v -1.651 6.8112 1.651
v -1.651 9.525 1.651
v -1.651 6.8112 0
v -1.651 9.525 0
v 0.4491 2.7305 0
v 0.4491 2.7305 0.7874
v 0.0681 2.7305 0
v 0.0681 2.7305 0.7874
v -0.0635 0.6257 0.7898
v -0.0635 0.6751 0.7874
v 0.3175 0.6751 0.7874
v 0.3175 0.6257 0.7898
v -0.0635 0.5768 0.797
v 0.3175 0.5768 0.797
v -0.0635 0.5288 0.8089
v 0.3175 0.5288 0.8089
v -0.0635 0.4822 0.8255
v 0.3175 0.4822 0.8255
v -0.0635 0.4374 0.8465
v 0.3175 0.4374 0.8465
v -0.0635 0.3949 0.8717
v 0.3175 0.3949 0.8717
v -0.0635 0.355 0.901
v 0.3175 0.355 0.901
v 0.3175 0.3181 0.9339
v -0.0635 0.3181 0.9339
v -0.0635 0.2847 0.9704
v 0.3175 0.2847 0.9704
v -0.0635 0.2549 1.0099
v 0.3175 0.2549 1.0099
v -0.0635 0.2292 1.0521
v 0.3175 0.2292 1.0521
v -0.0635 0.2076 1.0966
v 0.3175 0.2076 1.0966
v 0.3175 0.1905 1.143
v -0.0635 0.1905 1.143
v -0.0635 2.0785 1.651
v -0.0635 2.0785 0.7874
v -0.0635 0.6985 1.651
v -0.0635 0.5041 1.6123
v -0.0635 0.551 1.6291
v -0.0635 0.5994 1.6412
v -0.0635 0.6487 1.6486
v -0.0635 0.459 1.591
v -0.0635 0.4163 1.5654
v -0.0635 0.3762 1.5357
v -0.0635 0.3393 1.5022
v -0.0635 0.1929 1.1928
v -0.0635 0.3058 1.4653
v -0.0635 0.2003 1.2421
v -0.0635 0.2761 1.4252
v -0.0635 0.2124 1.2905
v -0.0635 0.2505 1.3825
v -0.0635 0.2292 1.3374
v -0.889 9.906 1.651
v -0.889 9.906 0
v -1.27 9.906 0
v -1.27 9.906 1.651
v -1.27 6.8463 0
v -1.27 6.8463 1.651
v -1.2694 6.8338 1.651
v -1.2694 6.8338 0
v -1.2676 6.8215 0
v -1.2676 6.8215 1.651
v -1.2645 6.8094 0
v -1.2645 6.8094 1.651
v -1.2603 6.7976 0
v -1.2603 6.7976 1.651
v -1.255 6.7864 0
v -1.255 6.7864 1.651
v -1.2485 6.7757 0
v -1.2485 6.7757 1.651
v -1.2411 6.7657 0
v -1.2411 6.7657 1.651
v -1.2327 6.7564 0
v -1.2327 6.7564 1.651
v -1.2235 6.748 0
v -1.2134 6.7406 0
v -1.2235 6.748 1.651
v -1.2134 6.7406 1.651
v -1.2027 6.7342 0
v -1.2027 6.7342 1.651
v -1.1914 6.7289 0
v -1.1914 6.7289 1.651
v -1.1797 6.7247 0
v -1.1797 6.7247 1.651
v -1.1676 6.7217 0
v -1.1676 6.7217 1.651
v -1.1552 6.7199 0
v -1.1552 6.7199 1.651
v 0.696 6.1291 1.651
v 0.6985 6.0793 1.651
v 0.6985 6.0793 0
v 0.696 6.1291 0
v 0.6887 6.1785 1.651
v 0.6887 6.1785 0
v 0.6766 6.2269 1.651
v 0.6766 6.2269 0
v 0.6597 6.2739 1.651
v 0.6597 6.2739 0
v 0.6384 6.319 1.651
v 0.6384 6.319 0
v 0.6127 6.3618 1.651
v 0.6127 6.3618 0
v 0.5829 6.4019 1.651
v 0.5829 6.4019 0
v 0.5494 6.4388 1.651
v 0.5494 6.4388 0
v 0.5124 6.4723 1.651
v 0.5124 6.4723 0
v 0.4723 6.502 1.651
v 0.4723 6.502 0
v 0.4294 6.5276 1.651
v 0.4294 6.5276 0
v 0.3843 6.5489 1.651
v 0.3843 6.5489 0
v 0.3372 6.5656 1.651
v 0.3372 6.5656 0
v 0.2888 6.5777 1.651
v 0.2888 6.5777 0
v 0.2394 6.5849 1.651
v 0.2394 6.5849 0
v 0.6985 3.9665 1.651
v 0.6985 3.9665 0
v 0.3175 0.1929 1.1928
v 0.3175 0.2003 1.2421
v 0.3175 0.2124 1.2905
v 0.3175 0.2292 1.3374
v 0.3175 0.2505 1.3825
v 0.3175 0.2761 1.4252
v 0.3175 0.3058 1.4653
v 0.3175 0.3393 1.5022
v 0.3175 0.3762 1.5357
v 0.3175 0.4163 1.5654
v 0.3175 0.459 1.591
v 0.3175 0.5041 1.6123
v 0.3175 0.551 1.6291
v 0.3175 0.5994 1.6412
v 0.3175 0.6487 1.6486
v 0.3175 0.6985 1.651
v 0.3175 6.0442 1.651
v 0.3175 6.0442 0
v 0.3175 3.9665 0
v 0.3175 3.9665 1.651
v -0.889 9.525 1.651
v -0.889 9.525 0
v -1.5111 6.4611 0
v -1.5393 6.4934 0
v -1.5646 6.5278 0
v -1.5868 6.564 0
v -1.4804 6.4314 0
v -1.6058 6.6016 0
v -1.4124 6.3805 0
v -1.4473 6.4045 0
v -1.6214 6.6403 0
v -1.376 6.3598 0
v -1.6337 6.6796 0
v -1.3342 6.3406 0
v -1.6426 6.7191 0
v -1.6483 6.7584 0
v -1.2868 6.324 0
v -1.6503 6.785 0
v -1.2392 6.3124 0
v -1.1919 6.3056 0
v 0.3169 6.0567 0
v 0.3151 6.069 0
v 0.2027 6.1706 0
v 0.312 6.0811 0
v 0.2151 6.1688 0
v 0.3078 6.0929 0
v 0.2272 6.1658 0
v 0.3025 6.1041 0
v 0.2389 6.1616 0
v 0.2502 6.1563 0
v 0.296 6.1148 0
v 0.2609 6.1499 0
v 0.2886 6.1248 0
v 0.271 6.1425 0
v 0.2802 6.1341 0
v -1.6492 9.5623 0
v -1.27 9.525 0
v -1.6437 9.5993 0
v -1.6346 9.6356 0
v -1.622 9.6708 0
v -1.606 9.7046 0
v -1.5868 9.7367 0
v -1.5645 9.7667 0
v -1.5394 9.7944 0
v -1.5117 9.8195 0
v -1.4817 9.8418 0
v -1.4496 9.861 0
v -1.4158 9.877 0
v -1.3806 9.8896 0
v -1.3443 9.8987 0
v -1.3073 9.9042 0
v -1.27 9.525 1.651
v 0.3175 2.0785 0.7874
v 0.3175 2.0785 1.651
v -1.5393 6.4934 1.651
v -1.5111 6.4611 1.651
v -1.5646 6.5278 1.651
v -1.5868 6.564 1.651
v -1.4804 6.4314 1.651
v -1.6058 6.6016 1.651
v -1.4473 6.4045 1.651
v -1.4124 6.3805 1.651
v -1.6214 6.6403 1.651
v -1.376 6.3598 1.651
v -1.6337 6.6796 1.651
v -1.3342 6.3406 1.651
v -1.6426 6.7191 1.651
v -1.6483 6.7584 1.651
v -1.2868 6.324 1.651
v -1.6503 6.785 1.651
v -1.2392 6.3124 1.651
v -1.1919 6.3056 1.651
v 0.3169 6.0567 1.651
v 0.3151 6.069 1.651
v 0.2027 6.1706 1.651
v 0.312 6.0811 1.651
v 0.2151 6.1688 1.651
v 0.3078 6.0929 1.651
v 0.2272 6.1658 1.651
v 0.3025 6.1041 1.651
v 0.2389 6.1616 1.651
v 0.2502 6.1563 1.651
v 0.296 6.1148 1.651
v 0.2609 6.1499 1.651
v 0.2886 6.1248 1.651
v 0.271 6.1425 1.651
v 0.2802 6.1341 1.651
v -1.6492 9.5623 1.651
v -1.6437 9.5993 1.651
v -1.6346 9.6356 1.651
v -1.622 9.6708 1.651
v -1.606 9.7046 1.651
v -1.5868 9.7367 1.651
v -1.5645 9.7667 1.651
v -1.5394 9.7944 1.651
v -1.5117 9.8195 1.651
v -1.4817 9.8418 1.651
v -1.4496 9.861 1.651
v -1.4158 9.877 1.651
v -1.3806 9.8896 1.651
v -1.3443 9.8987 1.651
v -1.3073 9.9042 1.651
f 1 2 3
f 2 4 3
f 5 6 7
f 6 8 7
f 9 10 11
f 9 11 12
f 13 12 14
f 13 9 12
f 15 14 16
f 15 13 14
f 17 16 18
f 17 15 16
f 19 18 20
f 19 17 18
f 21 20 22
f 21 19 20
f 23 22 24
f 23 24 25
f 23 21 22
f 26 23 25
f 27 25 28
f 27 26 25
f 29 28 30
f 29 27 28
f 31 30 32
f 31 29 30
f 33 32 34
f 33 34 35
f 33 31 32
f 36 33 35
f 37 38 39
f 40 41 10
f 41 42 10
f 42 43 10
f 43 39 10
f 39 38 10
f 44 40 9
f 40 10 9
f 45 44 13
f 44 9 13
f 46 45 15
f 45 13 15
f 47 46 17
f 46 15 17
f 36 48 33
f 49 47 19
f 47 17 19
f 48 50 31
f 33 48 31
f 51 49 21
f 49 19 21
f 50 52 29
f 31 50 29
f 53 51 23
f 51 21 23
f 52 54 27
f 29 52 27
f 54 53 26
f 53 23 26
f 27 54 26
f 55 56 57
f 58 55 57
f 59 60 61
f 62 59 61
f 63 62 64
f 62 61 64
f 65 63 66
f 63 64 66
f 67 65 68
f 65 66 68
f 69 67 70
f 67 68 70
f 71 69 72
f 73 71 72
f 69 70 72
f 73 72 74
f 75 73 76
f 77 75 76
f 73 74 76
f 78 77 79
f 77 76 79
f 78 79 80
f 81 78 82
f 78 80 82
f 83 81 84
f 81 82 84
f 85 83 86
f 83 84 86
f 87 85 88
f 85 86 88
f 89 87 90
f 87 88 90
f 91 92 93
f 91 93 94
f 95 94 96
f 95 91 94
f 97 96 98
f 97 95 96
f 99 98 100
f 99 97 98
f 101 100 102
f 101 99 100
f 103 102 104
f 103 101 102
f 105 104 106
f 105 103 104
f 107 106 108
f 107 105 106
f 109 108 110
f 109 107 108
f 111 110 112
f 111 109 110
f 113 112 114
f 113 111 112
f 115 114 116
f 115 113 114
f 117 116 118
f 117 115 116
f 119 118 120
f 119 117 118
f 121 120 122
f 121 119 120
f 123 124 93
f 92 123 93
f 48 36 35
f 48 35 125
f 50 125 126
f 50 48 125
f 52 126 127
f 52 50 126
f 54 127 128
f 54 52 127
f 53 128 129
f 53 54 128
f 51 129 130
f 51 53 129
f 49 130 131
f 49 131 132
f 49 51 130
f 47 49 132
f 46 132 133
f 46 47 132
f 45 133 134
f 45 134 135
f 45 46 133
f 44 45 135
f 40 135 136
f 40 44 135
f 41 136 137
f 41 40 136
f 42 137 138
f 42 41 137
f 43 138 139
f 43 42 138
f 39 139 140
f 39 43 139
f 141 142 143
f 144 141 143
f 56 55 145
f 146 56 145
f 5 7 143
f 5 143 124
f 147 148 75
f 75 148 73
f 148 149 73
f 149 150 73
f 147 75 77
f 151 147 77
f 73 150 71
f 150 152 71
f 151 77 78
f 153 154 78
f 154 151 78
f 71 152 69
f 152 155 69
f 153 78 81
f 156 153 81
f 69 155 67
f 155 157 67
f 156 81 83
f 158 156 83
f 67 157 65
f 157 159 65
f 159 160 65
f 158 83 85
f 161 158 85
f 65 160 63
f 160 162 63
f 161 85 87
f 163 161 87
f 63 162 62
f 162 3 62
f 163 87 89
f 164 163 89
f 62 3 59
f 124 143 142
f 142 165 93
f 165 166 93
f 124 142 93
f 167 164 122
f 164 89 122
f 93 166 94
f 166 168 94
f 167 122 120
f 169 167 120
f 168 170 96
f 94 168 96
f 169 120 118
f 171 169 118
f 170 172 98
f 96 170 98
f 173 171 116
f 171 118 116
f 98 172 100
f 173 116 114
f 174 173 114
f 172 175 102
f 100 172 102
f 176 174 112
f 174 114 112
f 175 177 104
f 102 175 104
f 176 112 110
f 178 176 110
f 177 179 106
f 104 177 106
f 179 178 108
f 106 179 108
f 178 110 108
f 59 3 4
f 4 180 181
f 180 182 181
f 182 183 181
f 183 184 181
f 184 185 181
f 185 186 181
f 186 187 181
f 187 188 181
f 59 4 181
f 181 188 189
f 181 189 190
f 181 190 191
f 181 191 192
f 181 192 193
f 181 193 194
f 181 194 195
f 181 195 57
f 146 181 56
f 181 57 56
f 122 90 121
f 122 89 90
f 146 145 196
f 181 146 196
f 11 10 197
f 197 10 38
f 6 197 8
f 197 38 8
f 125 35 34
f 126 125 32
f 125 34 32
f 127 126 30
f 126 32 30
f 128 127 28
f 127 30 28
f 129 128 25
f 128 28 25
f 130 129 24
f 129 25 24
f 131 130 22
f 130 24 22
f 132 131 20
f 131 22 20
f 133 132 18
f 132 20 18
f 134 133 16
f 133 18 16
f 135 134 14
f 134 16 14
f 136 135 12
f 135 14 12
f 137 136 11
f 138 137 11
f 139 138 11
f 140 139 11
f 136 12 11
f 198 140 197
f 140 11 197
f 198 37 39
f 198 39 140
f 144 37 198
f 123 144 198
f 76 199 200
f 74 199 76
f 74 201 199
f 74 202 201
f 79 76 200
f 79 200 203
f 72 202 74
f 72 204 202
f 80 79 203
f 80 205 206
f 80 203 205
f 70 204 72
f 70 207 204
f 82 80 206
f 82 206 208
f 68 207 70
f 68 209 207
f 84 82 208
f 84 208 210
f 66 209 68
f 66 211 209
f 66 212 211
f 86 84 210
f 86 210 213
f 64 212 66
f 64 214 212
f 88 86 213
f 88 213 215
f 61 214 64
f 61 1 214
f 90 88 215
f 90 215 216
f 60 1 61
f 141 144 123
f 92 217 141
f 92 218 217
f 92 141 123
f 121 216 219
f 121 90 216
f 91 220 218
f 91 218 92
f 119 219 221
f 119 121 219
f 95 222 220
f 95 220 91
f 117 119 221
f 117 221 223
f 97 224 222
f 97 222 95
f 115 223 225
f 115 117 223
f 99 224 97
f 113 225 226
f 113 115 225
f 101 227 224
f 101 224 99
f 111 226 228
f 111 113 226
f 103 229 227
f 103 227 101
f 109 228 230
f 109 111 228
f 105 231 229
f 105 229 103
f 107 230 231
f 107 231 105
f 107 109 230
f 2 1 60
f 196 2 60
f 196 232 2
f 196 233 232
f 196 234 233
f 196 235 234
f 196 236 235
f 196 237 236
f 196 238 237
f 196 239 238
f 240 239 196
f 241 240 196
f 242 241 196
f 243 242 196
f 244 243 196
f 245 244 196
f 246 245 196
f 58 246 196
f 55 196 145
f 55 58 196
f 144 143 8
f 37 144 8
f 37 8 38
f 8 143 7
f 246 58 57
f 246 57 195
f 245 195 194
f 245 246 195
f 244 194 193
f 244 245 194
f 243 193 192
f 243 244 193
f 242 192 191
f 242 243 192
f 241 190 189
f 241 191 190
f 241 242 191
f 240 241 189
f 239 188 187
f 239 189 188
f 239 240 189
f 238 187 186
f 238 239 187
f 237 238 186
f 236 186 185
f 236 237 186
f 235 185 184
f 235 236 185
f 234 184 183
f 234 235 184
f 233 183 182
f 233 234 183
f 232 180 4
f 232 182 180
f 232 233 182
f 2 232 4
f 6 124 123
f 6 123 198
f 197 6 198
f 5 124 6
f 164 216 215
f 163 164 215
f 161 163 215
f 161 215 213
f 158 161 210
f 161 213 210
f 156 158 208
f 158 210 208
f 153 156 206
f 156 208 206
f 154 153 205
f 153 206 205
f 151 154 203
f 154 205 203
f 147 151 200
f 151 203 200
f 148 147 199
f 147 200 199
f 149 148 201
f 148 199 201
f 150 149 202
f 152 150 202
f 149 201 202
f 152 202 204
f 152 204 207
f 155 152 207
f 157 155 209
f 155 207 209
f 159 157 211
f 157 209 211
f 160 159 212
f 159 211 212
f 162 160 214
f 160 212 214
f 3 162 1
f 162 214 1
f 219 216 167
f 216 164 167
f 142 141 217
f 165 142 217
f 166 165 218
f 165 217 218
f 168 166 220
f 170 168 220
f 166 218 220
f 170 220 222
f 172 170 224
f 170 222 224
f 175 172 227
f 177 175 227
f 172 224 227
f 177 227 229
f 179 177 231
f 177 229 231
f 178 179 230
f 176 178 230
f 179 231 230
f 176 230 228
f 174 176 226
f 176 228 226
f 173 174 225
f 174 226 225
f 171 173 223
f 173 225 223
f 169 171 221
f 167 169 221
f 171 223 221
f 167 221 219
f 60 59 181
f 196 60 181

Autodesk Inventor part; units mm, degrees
ref_plane "YZ Plane" through (0, 0, 0) normal (1, 0, 0) x (0, 1, 0)
ref_plane "XZ Plane" through (0, 0, 0) normal (0, 1, 0) x (-1, 0, 0)
ref_plane "XY Plane" through (0, 0, 0) normal (0, 0, 1) x (1, 0, 0)
sketch "Sketch1" plane through (0, 0, 0) normal (0, 0, 1) x (1, 0, 0)
  line L0 (0.6985, 3.9665) -> (0.6985, 6.5405)
  line L1 (0.3175, 6.1595) -> (0.3175, 3.9665)
  line L2 (-1.651, 6.35) -> (-1.651, 6.731)
  line L3 (-1.27, 6.731) -> (-1.27, 9.906)
  line L4 (-1.27, 9.906) -> (-1.651, 9.906)
  line L5 (-1.651, 9.906) -> (-1.651, 6.35)
  line L6 (-0.0635, 2.0785) -> (-0.0635, 0.1905)
  line L7 (-0.0635, 0.1905) -> (0.3175, 0.1905)
  line L8 (0.3175, 0.1905) -> (0.3175, 2.0785)
  line L9 (0.6985, 3.9665) -> (0.3175, 2.0785)
  line L10 (0.3175, 3.9665) -> (-0.0635, 2.0785)
  line L11 (-1.27, 6.731) -> (0.6985, 6.5405)
  line L12 (-1.651, 6.35) -> (0.3175, 6.1595)
  point P0 (0, 0)
  dimension "d3" = 0.381
  dimension "d4" = 0.381
extrude "Extrusion1" add sketch "Sketch1" along normal blind 1.651
fillet "Fillet1" radius 0.127 2 edges at (0.3175, 6.1595, 0.8255) (-1.27, 6.731, 0.8255)
fillet "Fillet2" radius 0.508 2 edges at (-1.651, 6.35, 0.8255) (0.6985, 6.5405, 0.8255)
fillet_without_effect "Fillet3"
sketch "Sketch3" plane through (-0.0635, 0.1905, 0) normal (-1, 0, 0) x (0, 0, 1)
  line L0 (0, 0) -> (0.7874, 0)
  line L1 (0.7874, 0) -> (0.7874, 2.54)
  line L2 (0.7874, 2.54) -> (0, 2.54)
  line L3 (0, 2.54) -> (0, 0)
  point P0 (0, -0.1905)
  dimension "d18" = 0.7874
  dimension "d19" = 2.54
extrude "Extrusion3" cut sketch "Sketch3" against normal through all
sketch "Sketch4" plane through (0, 0, 1.651) normal (0, 0, 1) x (1, 0, 0)
  line L0 (-1.651, 9.906) -> (-0.889, 9.906)
  line L1 (-0.889, 9.906) -> (-0.889, 9.525)
  line L2 (-0.889, 9.525) -> (-1.651, 9.525)
  line L3 (-1.651, 9.525) -> (-1.651, 9.906)
  point P0 (0, 0)
  dimension "d22" = 0.762
  dimension "d23" = 0.381
extrude "Extrusion4" add sketch "Sketch4" against normal blind 1.651
fillet "Fillet4" radius 0.381 1 edges at (-1.651, 9.906, 0.8255)
fillet "Fillet5" radius 0.508 2 edges at (0.127, 0.1905, 1.651) (0.127, 0.1905, 0.7874)
properties part number "pin_1"
